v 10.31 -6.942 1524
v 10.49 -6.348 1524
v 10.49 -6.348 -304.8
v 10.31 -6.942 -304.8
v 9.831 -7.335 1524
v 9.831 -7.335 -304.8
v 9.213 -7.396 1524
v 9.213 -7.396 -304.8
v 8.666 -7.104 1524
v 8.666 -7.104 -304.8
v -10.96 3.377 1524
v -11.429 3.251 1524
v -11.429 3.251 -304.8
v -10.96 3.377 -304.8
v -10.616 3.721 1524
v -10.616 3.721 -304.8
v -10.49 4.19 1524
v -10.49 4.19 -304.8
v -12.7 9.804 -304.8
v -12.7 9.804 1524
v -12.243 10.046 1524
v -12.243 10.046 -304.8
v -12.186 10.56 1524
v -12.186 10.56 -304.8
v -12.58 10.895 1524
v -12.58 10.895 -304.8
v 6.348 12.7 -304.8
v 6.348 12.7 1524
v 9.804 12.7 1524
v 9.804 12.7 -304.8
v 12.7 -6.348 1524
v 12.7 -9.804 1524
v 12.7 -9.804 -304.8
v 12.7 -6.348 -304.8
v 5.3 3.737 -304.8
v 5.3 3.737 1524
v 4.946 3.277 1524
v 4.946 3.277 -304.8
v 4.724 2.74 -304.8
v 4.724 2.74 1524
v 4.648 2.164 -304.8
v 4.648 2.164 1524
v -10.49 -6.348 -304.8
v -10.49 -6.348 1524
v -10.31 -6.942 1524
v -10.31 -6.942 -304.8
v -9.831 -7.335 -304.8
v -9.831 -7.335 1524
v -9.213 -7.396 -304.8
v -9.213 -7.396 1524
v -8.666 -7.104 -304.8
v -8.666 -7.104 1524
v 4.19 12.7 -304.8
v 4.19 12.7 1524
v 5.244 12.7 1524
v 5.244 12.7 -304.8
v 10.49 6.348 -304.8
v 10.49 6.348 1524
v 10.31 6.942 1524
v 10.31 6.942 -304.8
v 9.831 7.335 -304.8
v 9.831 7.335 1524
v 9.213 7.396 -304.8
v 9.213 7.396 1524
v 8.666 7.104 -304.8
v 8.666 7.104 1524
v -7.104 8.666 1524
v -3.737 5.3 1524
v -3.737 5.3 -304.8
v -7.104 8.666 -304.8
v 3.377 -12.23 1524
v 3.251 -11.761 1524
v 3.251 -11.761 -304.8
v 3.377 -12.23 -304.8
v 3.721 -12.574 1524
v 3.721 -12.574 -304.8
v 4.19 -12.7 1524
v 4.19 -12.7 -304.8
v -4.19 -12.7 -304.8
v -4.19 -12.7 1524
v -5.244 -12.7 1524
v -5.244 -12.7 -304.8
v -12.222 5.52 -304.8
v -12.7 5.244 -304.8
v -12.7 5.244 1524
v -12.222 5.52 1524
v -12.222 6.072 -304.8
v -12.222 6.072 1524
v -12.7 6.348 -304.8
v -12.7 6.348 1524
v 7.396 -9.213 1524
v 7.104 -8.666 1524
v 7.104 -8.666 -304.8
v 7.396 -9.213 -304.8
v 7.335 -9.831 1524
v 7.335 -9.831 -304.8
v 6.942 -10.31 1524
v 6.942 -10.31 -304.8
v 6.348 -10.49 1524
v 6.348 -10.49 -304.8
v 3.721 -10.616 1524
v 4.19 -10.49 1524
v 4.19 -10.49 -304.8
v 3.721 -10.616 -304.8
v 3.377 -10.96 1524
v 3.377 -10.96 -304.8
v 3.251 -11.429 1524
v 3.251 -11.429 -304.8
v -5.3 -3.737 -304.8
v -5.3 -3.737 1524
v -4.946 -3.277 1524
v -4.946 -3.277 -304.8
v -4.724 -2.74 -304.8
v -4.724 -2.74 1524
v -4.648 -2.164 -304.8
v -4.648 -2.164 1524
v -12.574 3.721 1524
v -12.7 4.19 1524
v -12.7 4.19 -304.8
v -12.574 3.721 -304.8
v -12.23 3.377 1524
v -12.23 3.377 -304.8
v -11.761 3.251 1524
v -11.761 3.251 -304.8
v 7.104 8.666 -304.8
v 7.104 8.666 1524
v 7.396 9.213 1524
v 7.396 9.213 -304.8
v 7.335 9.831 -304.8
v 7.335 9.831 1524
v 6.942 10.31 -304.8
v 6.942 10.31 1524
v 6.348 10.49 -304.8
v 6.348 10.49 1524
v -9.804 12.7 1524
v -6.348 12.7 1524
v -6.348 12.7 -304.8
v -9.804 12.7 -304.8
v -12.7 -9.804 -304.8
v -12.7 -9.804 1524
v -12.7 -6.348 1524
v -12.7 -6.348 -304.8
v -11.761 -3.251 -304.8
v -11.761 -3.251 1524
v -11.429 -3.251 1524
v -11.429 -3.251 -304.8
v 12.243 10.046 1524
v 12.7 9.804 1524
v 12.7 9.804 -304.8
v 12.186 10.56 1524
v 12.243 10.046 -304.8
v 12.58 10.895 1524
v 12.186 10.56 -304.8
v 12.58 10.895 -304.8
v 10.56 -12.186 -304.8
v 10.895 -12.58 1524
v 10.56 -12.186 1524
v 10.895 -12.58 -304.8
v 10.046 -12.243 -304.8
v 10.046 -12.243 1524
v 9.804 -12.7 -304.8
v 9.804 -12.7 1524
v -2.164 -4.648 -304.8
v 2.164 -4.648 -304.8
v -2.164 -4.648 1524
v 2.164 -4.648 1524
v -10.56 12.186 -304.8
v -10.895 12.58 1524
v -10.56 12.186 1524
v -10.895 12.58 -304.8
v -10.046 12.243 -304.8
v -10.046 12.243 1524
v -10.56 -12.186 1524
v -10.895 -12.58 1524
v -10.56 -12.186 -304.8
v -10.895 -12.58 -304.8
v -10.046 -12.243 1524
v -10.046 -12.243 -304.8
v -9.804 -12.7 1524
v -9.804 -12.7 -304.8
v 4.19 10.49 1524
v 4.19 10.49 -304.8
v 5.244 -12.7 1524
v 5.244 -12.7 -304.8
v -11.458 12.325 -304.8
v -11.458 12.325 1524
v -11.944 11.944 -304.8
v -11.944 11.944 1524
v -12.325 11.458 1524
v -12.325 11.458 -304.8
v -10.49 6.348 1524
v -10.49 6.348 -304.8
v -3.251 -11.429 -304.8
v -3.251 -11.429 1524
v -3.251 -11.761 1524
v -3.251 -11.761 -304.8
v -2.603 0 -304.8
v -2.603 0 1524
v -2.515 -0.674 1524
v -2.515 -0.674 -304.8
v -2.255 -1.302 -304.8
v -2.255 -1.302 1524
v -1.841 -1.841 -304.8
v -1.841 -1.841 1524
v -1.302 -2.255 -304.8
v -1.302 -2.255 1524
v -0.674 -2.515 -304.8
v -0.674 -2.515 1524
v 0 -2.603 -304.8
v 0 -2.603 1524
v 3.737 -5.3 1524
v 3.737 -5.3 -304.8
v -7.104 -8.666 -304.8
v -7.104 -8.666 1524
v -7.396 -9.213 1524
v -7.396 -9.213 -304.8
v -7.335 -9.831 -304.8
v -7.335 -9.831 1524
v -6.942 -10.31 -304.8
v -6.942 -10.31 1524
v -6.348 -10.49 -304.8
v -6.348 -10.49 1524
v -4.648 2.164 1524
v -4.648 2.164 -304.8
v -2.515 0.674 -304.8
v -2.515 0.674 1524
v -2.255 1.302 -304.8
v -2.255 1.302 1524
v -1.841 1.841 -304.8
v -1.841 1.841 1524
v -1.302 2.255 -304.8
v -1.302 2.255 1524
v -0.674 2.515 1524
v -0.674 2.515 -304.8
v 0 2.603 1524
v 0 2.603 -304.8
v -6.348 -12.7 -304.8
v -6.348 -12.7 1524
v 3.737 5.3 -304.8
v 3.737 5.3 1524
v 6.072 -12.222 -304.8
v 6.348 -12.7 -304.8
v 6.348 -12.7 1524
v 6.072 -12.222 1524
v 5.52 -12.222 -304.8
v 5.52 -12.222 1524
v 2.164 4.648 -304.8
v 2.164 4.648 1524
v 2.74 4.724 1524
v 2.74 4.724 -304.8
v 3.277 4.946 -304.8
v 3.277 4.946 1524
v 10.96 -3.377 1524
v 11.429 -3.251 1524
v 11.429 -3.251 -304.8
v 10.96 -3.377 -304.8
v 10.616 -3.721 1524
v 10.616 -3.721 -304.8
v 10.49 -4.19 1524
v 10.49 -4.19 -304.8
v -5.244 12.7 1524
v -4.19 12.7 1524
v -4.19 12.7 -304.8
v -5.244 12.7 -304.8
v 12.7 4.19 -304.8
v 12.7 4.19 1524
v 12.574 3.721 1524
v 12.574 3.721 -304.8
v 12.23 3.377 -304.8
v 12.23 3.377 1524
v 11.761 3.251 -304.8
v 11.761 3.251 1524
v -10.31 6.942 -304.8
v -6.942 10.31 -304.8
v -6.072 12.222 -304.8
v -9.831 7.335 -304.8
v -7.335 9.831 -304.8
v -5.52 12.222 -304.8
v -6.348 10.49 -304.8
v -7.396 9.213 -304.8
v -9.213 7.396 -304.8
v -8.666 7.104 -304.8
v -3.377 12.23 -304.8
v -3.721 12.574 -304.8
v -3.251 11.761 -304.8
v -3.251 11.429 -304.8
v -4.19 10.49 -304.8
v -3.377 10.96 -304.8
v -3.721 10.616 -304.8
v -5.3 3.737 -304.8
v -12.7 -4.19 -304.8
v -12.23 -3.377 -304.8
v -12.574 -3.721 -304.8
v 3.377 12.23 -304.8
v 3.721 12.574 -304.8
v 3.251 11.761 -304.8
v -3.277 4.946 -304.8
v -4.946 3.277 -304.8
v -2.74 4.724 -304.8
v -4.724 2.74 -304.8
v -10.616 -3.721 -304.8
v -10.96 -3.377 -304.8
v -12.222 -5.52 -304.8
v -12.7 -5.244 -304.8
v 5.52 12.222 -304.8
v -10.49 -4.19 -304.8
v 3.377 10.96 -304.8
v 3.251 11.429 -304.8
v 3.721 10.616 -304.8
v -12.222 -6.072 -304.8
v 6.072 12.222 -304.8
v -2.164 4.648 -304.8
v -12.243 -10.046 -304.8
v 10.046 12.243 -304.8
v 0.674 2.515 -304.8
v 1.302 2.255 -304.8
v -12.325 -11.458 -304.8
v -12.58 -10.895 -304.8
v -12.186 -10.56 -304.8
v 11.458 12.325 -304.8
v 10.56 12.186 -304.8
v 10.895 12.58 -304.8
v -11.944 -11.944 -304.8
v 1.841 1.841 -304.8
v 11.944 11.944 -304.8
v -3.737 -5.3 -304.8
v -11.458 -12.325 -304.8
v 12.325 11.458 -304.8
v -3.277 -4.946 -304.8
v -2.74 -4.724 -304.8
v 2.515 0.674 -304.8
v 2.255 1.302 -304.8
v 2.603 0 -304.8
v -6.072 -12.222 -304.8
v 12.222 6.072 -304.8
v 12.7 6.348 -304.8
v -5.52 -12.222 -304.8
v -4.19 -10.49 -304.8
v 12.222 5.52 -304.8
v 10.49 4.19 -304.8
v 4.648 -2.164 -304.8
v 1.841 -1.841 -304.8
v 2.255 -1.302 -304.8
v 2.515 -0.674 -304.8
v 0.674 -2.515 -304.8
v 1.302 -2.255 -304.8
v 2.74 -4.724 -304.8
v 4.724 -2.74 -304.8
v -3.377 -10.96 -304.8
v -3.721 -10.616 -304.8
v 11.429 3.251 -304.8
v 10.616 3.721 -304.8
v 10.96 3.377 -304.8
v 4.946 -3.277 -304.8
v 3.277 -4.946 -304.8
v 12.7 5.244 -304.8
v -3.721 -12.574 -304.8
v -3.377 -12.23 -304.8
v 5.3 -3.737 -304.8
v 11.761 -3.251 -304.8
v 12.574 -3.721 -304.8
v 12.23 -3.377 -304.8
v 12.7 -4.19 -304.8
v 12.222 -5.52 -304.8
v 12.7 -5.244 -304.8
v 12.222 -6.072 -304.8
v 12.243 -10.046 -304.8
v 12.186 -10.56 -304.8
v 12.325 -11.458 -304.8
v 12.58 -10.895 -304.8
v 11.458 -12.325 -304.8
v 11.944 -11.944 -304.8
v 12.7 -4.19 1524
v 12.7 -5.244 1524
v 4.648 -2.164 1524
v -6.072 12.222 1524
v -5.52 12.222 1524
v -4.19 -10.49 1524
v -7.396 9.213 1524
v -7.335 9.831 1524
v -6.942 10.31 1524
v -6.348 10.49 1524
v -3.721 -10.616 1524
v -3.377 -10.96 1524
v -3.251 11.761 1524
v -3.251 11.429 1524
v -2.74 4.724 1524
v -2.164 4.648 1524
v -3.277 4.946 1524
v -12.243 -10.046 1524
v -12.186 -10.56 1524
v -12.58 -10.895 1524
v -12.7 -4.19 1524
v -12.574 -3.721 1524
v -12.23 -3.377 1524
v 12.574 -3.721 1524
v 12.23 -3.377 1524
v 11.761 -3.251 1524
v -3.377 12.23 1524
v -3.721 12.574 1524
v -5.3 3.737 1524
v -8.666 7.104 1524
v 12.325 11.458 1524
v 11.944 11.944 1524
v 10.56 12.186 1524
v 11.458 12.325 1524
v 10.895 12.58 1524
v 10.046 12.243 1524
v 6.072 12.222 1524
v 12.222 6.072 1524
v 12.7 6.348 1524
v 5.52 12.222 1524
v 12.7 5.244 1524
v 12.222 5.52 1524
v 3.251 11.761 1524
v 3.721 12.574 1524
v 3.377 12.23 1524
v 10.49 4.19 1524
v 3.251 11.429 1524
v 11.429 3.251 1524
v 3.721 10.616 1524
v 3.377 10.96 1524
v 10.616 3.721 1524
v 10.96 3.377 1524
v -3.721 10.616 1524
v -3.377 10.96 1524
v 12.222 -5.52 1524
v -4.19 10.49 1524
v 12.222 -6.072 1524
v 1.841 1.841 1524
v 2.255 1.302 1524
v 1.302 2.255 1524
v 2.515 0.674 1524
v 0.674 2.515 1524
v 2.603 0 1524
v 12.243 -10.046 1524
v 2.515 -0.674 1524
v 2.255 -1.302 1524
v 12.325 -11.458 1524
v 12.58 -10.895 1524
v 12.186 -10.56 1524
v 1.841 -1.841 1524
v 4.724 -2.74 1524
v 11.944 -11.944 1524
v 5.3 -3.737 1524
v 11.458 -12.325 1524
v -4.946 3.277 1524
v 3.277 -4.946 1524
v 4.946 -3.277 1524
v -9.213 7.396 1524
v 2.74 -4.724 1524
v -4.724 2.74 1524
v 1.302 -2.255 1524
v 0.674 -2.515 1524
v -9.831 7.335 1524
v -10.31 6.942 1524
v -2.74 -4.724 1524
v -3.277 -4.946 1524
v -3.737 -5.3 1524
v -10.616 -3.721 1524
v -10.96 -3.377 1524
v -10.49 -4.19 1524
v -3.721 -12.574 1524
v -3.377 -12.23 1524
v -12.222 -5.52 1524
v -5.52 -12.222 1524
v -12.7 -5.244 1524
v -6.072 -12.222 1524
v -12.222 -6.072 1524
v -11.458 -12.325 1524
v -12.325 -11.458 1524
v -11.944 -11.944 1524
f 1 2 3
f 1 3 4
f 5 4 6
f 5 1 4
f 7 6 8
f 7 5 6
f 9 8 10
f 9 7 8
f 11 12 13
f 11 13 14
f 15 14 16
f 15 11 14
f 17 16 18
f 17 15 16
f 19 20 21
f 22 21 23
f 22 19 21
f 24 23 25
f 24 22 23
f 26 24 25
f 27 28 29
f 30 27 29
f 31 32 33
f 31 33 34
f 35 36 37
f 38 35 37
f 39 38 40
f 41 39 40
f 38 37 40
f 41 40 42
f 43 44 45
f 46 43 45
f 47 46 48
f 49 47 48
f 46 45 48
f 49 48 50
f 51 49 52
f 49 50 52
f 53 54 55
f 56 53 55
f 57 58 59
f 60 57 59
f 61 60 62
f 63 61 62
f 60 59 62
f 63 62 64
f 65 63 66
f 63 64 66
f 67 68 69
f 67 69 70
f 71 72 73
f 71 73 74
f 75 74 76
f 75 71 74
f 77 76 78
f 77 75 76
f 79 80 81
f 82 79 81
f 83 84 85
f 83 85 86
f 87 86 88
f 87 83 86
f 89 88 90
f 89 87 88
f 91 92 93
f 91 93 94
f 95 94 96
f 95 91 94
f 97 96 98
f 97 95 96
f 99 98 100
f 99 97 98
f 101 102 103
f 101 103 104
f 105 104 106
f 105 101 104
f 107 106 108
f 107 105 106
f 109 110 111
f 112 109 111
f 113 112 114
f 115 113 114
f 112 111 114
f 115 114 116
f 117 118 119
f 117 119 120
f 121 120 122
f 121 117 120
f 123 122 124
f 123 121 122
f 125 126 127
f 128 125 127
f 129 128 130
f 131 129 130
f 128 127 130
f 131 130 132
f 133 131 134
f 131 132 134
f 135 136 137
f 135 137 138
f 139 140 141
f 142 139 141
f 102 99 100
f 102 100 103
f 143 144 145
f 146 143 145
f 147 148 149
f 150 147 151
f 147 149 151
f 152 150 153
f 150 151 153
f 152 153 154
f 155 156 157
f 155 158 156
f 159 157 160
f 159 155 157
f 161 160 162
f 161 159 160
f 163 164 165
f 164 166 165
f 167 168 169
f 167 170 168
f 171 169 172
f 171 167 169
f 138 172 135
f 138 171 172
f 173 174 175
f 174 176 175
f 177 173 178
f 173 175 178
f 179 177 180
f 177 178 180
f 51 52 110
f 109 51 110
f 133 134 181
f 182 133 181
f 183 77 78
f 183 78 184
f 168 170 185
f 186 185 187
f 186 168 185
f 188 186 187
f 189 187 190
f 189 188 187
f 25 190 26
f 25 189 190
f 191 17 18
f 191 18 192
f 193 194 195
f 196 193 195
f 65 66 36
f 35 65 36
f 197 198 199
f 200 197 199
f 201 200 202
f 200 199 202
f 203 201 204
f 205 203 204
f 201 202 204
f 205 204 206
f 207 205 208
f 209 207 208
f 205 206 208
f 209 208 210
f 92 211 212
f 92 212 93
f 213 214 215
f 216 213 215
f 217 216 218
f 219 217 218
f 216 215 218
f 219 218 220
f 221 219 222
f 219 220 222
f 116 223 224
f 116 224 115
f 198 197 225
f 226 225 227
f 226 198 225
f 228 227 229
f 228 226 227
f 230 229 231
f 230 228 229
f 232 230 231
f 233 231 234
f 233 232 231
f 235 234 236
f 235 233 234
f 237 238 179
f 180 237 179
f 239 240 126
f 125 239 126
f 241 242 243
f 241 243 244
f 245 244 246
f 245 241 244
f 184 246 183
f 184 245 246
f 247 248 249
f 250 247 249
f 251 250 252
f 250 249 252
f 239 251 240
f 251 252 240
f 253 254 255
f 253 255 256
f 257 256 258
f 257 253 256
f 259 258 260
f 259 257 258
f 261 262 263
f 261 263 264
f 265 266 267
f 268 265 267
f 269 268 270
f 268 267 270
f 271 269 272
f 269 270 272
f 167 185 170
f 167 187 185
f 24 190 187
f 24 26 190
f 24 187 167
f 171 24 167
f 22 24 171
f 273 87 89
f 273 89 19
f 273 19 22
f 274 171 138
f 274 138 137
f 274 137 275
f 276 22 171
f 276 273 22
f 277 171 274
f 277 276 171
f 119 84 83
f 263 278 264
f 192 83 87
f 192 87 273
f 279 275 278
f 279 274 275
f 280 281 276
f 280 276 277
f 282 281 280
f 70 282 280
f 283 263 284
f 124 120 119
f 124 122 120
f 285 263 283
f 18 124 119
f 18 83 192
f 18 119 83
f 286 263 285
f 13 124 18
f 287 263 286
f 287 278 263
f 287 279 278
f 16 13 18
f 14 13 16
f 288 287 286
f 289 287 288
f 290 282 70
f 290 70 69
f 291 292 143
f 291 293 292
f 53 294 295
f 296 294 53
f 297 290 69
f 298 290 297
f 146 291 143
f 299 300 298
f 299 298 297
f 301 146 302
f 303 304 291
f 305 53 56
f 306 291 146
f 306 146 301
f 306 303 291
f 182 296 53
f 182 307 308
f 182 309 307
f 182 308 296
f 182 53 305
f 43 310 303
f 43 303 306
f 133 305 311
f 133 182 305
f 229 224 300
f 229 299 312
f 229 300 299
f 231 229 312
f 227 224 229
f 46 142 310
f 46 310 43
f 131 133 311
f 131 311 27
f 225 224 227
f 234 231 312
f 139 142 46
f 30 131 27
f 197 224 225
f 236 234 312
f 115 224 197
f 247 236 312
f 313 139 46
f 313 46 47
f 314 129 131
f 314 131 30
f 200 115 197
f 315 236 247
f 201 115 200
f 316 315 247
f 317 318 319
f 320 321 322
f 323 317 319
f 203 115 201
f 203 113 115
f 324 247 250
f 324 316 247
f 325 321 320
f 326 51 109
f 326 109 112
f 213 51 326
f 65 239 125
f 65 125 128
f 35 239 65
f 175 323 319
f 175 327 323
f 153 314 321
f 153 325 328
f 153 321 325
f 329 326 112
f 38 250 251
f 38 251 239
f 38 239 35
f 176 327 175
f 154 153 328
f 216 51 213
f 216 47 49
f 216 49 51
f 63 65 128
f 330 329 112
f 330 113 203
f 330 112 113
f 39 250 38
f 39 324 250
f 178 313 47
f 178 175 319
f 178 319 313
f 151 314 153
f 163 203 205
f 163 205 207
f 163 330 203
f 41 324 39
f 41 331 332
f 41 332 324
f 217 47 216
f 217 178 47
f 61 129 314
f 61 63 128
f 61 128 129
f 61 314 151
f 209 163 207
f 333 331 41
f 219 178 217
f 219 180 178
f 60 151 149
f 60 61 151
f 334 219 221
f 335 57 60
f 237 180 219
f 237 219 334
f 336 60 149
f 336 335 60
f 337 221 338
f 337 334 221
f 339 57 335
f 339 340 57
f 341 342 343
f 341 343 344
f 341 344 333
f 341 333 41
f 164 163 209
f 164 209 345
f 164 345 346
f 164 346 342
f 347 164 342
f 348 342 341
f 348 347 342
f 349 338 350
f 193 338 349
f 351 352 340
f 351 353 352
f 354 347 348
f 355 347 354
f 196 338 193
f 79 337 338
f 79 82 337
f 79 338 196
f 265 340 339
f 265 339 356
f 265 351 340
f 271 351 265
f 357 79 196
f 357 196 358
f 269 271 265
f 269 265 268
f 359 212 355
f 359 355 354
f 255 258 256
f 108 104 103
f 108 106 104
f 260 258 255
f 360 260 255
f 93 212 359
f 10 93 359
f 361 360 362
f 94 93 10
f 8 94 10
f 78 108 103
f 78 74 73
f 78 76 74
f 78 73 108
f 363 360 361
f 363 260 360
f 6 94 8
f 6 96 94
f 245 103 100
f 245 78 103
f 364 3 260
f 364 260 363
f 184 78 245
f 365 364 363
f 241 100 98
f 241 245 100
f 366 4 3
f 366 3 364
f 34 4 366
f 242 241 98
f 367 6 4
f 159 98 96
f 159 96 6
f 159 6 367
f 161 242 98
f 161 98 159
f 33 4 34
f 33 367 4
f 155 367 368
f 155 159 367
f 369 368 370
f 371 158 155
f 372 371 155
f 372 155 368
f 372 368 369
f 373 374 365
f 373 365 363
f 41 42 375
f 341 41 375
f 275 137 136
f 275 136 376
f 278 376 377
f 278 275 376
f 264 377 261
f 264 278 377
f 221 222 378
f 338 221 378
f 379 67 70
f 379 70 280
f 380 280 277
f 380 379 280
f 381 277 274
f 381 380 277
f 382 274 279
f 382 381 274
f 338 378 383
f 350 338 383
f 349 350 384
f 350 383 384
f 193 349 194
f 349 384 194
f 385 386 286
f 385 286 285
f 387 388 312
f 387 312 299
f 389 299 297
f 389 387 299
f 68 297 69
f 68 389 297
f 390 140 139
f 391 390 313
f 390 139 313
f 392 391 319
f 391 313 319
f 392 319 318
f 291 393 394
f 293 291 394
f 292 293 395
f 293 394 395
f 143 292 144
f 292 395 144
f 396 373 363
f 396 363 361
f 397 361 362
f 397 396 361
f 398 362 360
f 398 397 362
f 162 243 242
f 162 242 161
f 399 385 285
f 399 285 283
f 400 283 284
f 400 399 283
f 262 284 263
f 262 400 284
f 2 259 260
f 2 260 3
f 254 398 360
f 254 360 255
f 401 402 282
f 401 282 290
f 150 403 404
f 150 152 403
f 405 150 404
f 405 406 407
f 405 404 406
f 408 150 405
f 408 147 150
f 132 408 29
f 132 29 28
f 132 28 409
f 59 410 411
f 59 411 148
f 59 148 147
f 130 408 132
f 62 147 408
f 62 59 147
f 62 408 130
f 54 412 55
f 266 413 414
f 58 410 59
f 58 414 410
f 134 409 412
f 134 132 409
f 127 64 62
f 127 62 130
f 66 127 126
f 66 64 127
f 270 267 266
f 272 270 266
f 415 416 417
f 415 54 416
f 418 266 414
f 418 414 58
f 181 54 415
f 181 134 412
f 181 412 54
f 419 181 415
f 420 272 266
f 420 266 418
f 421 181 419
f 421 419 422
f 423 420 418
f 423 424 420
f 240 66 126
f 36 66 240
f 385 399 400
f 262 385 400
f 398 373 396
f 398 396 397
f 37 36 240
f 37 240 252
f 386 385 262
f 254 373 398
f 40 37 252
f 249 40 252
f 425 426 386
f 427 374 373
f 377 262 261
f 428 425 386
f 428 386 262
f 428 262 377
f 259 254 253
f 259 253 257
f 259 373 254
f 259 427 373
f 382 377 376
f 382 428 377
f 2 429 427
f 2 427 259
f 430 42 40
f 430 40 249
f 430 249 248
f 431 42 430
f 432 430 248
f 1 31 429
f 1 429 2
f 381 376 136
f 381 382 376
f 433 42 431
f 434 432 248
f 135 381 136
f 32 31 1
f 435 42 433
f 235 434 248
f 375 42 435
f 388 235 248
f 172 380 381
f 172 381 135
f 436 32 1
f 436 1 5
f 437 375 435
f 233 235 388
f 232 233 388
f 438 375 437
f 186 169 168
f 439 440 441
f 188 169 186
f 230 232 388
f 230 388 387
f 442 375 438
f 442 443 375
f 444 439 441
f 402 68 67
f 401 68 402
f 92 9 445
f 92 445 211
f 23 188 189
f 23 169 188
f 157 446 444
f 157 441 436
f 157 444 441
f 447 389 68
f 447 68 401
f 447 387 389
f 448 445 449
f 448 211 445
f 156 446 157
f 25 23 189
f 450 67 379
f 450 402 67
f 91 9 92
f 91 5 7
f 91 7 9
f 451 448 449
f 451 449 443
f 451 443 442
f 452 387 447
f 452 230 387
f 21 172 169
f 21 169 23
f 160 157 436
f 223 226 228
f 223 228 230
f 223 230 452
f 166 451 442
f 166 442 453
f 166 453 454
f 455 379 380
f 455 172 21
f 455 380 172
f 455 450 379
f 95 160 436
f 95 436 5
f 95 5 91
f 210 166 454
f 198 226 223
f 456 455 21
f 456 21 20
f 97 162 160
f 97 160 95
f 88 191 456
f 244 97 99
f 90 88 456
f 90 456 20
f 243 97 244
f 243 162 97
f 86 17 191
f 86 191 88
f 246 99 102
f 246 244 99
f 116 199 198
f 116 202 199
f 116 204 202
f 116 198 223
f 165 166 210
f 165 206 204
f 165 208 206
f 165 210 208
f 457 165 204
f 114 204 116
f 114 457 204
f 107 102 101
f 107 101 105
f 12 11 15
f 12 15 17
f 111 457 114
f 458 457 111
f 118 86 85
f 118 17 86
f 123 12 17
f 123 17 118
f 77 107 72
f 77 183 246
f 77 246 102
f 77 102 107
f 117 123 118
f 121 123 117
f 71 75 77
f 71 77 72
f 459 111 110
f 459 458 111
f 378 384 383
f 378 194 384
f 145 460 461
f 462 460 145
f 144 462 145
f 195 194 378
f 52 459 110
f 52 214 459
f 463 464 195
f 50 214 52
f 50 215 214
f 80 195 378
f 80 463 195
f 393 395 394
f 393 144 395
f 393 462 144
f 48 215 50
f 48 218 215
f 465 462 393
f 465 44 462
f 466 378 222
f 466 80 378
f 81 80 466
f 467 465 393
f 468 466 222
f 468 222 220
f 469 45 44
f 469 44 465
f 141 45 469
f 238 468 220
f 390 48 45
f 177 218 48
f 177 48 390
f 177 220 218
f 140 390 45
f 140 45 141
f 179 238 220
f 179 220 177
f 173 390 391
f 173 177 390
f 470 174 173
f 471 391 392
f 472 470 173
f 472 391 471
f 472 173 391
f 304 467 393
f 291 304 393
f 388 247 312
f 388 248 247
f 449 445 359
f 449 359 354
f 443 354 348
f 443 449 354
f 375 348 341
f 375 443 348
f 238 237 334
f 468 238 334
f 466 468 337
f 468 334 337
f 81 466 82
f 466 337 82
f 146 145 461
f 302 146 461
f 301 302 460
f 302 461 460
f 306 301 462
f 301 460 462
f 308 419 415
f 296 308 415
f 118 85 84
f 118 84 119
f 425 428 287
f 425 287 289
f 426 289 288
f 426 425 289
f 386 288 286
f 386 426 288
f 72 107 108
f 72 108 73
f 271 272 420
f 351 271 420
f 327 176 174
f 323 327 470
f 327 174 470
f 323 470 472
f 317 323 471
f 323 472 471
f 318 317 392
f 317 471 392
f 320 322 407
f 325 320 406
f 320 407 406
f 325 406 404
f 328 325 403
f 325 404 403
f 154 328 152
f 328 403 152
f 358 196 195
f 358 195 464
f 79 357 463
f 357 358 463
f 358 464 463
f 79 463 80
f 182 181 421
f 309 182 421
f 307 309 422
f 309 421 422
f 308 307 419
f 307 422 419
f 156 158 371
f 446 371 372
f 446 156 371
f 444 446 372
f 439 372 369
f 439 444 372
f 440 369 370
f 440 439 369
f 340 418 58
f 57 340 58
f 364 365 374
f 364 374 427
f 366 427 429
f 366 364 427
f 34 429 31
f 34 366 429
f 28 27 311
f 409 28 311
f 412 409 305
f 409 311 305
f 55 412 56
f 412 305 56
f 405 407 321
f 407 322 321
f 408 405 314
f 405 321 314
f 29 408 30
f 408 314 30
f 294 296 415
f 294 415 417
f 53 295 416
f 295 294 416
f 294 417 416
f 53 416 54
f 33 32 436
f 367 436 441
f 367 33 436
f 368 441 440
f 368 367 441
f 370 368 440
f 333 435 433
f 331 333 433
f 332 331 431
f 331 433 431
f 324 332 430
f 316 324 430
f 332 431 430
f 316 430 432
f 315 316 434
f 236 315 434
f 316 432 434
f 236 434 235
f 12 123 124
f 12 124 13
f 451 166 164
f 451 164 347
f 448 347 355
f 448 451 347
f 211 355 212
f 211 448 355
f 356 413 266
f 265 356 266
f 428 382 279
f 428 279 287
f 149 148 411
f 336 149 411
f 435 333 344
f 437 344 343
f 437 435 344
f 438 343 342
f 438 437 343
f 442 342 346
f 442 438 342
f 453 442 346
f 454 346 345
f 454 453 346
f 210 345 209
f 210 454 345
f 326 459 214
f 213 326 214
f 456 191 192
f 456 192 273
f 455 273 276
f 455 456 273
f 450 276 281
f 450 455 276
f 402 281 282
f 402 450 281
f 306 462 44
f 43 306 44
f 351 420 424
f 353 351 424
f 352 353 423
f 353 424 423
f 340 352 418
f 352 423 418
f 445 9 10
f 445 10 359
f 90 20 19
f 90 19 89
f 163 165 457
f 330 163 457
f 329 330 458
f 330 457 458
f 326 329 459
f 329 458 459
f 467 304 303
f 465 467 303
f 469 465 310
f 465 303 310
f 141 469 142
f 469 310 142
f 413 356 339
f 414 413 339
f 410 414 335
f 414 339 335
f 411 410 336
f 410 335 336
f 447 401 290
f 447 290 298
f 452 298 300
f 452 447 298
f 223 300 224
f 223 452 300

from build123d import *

# Parameters (mm, degrees)
BOSS_EXTRUDE1_DEPTH     = 1524
CUT_EXTRUDE1_DEPTH      = 1525.105829659
CUT_EXTRUDE1_DEPTH_BACK = 1525.105829659
SKETCH5_R               = 0.55245
CUT_EXTRUDE2_DEPTH      = 1525.105829659
CUT_EXTRUDE2_DEPTH_BACK = 1525.105829659
SKETCH8_W               = 50.559993734
SKETCH8_H               = 1231.9


with BuildPart() as part:
    # Sketch4 → Boss-Extrude1 (new, symmetric)
    with BuildSketch(Plane.XY):
        with BuildLine():
            Line((4.190365, -12.7), (10.11729625, -12.7))
            ThreePointArc((10.11729625, -12.7), (11.943543585, -11.943543585), (12.7, -10.11729625))
            Line((12.7, -10.11729625), (12.7, -4.190365))
            ThreePointArc((12.7, -4.190365), (12.42492494, -3.52627506), (11.760835, -3.2512))
            Line((11.760835, -3.2512), (11.429365, -3.2512))
            ThreePointArc((11.429365, -3.2512), (10.76527506, -3.52627506), (10.4902, -4.190365))
            Line((10.4902, -4.190365), (10.4902, -6.348478019))
            ThreePointArc((10.4902, -6.348478019), (9.830707141, -7.335478831), (8.666460301, -7.103895736))
            Line((8.666460301, -7.103895736), (5.299899128, -3.737334563))
            ThreePointArc((5.299899128, -3.737334563), (4.817571085, -3.015479634), (4.6482, -2.16399369))
            Line((4.6482, -2.16399369), (4.6482, 0))
            Line((4.6482, 0), (2.6035, 0))
            ThreePointArc((2.6035, 0), (1.840952505, -1.840952505), (0, -2.6035))
            Line((0, -2.6035), (0, -4.6482))
            Line((0, -4.6482), (2.16399369, -4.6482))
            ThreePointArc((2.16399369, -4.6482), (3.015479634, -4.817571085), (3.737334563, -5.299899128))
            Line((3.737334563, -5.299899128), (7.103895736, -8.666460301))
            ThreePointArc((7.103895736, -8.666460301), (7.335478831, -9.830707141), (6.348478019, -10.4902))
            Line((6.348478019, -10.4902), (4.190365, -10.4902))
            ThreePointArc((4.190365, -10.4902), (3.52627506, -10.76527506), (3.2512, -11.429365))
            Line((3.2512, -11.429365), (3.2512, -11.760835))
            ThreePointArc((3.2512, -11.760835), (3.52627506, -12.42492494), (4.190365, -12.7))
        make_face()
    extrude(amount=BOSS_EXTRUDE1_DEPTH, both=True)

    # Sketch5 → Cut-Extrude1 (cut, two sides: drawn at the far end of the back side and taken through both)
    with BuildSketch(Plane.XY.offset(-CUT_EXTRUDE1_DEPTH_BACK)):
        with Locations((10.356153152, -12.7)):
            Circle(SKETCH5_R)
        with Locations((5.796028019, -12.7)):
            Circle(SKETCH5_R)
        with Locations((12.7, -10.356153152)):
            Circle(SKETCH5_R)
        with Locations((12.7, -5.796028019)):
            Circle(SKETCH5_R)
    extrude(amount=CUT_EXTRUDE1_DEPTH + CUT_EXTRUDE1_DEPTH_BACK, mode=Mode.SUBTRACT)

    # Mirror1: part across plane


with BuildPart() as part_1:
    add(part.part)
    add(part.part.mirror(Plane(origin=(0, 0, 0), x_dir=(0, 0, 1), z_dir=(1, 0, 0))))

    # Mirror2: part across plane


with BuildPart() as part_2:
    add(part_1.part)
    add(part_1.part.mirror(Plane.ZX))

    # Sketch8 → Cut-Extrude2 (cut, two sides: drawn at the far end of the back side and taken through both)
    with BuildSketch(Plane(origin=(0, 0, 0), x_dir=(1, 0, 0), z_dir=(0, 1, 0)).offset(-CUT_EXTRUDE2_DEPTH_BACK)):
        with Locations((0, 920.75)):
            Rectangle(SKETCH8_W, SKETCH8_H)
    extrude(amount=CUT_EXTRUDE2_DEPTH + CUT_EXTRUDE2_DEPTH_BACK, mode=Mode.SUBTRACT)


solid = part_2.part
